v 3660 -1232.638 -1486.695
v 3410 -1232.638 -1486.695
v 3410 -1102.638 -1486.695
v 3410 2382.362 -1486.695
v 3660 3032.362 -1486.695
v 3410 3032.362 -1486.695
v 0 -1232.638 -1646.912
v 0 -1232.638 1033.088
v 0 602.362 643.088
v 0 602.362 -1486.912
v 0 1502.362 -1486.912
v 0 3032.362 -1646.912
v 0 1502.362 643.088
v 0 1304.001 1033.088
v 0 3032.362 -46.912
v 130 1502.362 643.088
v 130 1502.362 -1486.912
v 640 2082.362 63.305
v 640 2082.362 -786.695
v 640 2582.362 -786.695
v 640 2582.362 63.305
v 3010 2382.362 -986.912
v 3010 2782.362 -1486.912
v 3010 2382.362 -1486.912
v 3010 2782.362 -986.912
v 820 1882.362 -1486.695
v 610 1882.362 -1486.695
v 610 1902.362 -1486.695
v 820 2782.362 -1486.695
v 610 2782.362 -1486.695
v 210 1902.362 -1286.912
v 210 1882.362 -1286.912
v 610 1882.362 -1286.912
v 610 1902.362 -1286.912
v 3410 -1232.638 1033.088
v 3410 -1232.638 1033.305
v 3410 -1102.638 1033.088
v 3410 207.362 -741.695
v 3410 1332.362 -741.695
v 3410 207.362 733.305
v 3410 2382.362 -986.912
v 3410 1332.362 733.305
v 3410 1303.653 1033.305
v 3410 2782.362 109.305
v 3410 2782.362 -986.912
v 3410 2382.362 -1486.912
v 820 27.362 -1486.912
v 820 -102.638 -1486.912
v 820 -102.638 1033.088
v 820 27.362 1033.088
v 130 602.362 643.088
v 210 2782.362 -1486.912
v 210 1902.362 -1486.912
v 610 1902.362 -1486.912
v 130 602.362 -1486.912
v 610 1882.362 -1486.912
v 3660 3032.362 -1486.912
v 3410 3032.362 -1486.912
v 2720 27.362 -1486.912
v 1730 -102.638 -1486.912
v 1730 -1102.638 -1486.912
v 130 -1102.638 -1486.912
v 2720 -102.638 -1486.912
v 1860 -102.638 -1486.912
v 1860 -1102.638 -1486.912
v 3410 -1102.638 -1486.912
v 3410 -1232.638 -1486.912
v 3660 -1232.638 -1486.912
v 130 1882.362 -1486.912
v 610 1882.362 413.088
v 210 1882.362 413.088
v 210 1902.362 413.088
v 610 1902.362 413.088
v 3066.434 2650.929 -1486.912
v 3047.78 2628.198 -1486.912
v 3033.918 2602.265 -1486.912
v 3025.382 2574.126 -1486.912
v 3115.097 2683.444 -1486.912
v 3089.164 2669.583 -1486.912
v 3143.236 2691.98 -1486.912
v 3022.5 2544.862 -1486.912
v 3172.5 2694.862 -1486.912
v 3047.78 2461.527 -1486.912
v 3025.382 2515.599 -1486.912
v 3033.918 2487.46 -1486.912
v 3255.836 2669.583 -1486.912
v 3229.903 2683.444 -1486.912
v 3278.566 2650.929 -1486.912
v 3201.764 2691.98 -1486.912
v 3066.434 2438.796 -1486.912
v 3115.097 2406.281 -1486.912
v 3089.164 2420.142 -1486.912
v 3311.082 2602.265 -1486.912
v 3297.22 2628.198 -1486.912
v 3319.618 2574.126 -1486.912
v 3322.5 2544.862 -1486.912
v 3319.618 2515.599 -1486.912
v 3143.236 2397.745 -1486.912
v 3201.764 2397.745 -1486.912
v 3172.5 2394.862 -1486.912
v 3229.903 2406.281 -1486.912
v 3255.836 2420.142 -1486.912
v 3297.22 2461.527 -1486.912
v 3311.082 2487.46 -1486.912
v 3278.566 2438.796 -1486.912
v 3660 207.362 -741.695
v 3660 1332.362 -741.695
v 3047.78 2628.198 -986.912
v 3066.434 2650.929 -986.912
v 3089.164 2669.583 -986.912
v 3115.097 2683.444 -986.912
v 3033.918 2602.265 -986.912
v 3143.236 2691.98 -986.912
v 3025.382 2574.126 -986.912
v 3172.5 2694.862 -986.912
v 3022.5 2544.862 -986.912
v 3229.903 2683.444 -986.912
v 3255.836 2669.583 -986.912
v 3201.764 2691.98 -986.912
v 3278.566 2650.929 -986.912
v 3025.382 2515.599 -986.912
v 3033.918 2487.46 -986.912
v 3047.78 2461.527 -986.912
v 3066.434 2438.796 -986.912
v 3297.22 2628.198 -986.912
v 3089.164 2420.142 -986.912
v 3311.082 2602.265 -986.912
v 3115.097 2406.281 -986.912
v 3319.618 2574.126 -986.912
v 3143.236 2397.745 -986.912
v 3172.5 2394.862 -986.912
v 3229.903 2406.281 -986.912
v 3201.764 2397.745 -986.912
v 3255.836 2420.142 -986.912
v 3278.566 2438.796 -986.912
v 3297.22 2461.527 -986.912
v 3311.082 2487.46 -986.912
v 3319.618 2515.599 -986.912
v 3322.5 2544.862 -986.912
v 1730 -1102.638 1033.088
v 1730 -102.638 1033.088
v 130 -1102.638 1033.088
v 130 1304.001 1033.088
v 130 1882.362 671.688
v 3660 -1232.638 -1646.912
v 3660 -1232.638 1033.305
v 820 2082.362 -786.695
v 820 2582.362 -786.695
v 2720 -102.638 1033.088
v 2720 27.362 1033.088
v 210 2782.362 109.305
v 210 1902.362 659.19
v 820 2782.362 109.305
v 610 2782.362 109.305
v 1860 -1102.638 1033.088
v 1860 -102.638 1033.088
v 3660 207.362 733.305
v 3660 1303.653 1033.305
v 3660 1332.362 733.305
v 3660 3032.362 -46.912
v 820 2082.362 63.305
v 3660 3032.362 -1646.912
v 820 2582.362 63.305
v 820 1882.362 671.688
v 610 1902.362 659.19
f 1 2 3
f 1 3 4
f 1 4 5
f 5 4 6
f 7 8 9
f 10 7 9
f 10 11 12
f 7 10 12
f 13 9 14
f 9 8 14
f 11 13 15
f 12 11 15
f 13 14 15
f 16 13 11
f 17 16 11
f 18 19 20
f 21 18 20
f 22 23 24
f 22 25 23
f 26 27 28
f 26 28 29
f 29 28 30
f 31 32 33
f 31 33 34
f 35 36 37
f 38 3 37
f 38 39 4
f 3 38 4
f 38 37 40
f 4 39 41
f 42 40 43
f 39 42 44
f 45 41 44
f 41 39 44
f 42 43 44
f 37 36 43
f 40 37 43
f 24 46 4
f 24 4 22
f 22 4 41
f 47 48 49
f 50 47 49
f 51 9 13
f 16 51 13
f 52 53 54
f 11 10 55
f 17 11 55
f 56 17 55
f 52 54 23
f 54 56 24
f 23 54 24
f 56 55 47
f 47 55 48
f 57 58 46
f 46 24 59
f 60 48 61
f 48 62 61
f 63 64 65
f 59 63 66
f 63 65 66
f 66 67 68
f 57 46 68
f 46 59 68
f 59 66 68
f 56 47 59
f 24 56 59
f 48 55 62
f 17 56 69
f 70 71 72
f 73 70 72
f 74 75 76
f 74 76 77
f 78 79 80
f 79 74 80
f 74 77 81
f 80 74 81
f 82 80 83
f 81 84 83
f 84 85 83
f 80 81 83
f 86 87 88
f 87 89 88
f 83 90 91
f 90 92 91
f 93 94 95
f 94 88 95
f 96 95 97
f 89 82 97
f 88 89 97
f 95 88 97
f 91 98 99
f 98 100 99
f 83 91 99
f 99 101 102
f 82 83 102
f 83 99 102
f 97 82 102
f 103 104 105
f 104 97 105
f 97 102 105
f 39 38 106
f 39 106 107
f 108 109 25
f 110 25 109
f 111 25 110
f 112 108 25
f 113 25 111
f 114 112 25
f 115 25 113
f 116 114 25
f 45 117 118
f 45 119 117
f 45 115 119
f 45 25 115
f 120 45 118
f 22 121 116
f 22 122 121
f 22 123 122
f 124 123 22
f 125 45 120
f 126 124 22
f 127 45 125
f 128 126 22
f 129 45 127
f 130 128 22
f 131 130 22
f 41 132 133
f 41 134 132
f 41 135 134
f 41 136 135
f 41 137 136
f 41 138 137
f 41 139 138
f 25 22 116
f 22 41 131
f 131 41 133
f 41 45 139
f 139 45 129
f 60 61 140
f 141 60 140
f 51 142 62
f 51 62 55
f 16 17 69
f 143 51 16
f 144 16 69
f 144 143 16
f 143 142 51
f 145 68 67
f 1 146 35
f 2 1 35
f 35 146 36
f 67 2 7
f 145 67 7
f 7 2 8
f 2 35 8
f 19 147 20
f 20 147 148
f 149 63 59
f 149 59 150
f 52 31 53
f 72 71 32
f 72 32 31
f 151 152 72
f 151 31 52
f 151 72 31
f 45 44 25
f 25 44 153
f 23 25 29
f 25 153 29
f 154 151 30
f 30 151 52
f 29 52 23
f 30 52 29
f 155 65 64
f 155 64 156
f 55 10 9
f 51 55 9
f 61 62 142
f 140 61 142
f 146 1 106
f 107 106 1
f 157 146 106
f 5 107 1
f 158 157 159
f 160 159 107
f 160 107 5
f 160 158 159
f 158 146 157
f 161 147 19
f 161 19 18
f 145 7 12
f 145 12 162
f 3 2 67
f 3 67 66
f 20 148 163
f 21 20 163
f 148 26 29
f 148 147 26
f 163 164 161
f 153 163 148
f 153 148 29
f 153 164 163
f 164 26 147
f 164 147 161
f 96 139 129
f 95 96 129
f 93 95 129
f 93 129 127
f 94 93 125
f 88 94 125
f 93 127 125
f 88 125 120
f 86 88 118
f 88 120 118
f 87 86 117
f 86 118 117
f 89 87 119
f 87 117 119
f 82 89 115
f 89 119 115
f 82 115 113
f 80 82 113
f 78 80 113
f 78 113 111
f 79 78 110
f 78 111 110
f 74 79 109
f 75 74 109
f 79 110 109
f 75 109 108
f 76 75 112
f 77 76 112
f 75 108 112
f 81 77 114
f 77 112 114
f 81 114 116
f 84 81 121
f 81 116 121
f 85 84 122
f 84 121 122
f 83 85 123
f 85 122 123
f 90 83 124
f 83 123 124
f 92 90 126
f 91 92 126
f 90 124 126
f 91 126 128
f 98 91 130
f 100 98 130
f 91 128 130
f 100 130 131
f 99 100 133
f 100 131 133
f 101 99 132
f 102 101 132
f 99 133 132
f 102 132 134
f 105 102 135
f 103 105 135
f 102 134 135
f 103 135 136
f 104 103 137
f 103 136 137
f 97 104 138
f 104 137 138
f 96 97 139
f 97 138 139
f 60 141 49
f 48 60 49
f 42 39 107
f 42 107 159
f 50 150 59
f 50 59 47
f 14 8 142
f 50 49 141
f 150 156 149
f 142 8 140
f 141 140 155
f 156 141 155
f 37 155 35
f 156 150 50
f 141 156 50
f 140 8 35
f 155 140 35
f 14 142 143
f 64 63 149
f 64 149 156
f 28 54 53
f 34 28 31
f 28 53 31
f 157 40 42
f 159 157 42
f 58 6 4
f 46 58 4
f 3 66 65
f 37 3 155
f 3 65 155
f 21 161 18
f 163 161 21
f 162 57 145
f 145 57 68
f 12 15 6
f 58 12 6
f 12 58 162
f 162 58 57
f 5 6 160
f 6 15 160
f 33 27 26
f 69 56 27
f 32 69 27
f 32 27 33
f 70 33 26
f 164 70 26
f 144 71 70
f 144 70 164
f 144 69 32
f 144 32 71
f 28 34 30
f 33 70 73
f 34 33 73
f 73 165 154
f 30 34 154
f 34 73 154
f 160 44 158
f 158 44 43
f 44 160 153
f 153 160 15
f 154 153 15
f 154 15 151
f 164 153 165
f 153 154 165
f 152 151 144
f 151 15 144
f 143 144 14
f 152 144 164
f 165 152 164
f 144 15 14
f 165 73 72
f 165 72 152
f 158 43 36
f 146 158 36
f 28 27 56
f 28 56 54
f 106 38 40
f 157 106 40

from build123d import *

# Parameters (mm, degrees)
F1_DEPTH  = 130
F2_DEPTH  = 210
F3_DEPTH  = 3410
F4_W      = 1125
F4_H      = 1475
F5_DEPTH  = 250
F8_DEPTH  = 210
F9_W      = 500
F9_H      = 850
F10_DEPTH = 180
F11_W     = 20
F11_H     = 200
F12_DEPTH = 400
F13_W     = 400
F13_H     = 0.2173379773
F13_H_2   = 499.7826620227
F14_DEPTH = 400
F15_R     = 150
F16_DEPTH = 500
F17_W     = 130
F17_H     = 2520
F18_DEPTH = 3280
F19_W     = 130
F19_H     = 2520
F20_DEPTH = 1000
F21_W     = 860
F21_H     = 2520
F21_W_2   = 130
F21_W_3   = 910
F22_DEPTH = 130
F24_DEPTH = 160


with BuildPart() as f1:
    # F0 (on Right) → F1 (new body)
    with BuildSketch(Plane.YZ):
        Polygon((-1232.6375129807, 1033.0878686905), (-1232.6375129807, -1486.9121313095), (602.3624870193, -1486.9121313095), (602.3624870193, 643.0878686905), (1502.3624870193, 643.0878686905), (1502.3624870193, -1486.9121313095), (1882.3624870193, -1486.9121313095), (1882.3624870193, 671.6876233862), (1304.001195655, 1033.0878686905), align=None)
    extrude(amount=F1_DEPTH)

    # F0 (on Right) → F2 (join)
    with BuildSketch(Plane.YZ):
        Polygon((2782.3624870193, 109.3052066678), (1882.3624870193, 671.6876233862), (1882.3624870193, -1486.9121313095), (2782.3624870193, -1486.9121313095), align=None)
    extrude(amount=F2_DEPTH)

    # F0 (on Right) → F3 (join)
    with BuildSketch(Plane.YZ):
        Polygon((3032.3624870193, -46.9121313095), (2782.3624870193, 109.3052066678), (2782.3624870193, -1486.9121313095), (3032.3624870193, -1486.9121313095), align=None)
    extrude(amount=F3_DEPTH)

    # F4 (on face) → F5 (join)
    with BuildSketch(Plane.YZ.offset(3410)):
        Polygon((-1232.6375129807, 1033.3052066678), (-1232.6375129807, -1486.6947933322), (1882.3624870193, -1486.6947933322), (1882.3624870193, 671.6876233862), (1303.6533821854, 1033.3052066678), align=None)
        with Locations((769.8624870193, -4.1947933322)):
            Rectangle(F4_W, F4_H, mode=Mode.SUBTRACT)
        Polygon((1882.3624870193, 671.6876233862), (1882.3624870193, -1486.6947933322), (2782.3624870193, -1486.6947933322), (2782.3624870193, 109.3052066678), align=None)
        Polygon((2782.3624870193, 109.3052066678), (2782.3624870193, -1486.6947933322), (3032.3624870193, -1486.6947933322), (3032.3624870193, -46.9121313095), align=None)
    extrude(amount=F5_DEPTH)



with BuildPart() as f8:
    # F7 (on offset) → F8 (new body)
    with BuildSketch(Plane.YZ.offset(610)):
        Polygon((2782.3624870193, 109.3052066678), (1882.3624870193, 671.6876233862), (1882.3624870193, -1486.6947933322), (2782.3624870193, -1486.6947933322), align=None)
    extrude(amount=F8_DEPTH)

    # F9 (on face) → F10 (cut)
    with BuildSketch(Plane.YZ.offset(820)):
        with Locations((2332.3624870193, -361.6947933322)):
            Rectangle(F9_W, F9_H)
    extrude(amount=-F10_DEPTH, mode=Mode.SUBTRACT)


with BuildPart() as f1_1:
    add(f1.part)

    add(f8.part)  # F12 merges F8
    # F11 (on face) → F12 (join)
    with BuildSketch(Plane.YZ.offset(210)):
        with Locations((1892.3624870193, -1386.9121313095)):
            Rectangle(F11_W, F11_H)
        Polygon((1902.3624870193, 659.190236348), (1882.3624870193, 671.6876233862), (1882.3624870193, 413.0878686905), (1902.3624870193, 413.0878686905), align=None)
    extrude(amount=F12_DEPTH)

    # F13 (on face) → F14 (join)
    with BuildSketch(Plane(origin=(3410, 0, 0), x_dir=(0, -1, 0), z_dir=(-1, 0, 0))):
        with Locations((-2582.3624870193, -1486.8034623208)):
            Rectangle(F13_W, F13_H)
        with Locations((-2582.3624870193, -1236.8034623208)):
            Rectangle(F13_W, F13_H_2)
    extrude(amount=F14_DEPTH)

    # F15 (on face) → F16 (cut, through all)
    with BuildSketch(Plane.XY.offset(-986.9121313095)):
        with Locations((3172.5, 2544.8624870193)):
            Circle(F15_R)
    extrude(amount=-F16_DEPTH, mode=Mode.SUBTRACT)

    # F17 (on face) → F18 (join, through all)
    with BuildSketch(Plane.YZ.offset(130)):
        with Locations((-1167.6375129807, -226.9121313095)):
            Rectangle(F17_W, F17_H)
    extrude(amount=F18_DEPTH)

    # F19 (on face) → F20 (join)
    with BuildSketch(Plane(origin=(0, -1102.6375129807, 0), x_dir=(-1, 0, 0), z_dir=(0, 1, 0))):
        with Locations((-1795, -226.9121313095)):
            Rectangle(F19_W, F19_H)
    extrude(amount=F20_DEPTH)

    # F21 (on face) → F22 (join)
    with BuildSketch(Plane(origin=(0, -102.6375129807, 0), x_dir=(-1, 0, 0), z_dir=(0, 1, 0))):
        with Locations((-2290, -226.9121313095)):
            Rectangle(F21_W, F21_H)
        with Locations((-1795, -226.9121313095)):
            Rectangle(F21_W_2, F21_H)
        with Locations((-1275, -226.9121313095)):
            Rectangle(F21_W_3, F21_H)
    extrude(amount=F22_DEPTH)

    # F23 (on face) → F24 (join)
    with BuildSketch(Plane(origin=(0, 0, -1486.9121313095), x_dir=(1, 0, 0), z_dir=(0, 0, -1))):
        Polygon((3660, 1232.6375129807), (3410, 1232.6375129807), (3410, 1102.6375129807), (1860, 1102.6375129807), (1860, 102.6375129807), (2720, 102.6375129807), (2720, -27.3624870193), (820, -27.3624870193), (820, 102.6375129807), (1730, 102.6375129807), (1730, 1102.6375129807), (130, 1102.6375129807), (130, -602.3624870193), (0, -602.3624870193), (0, -3032.3624870193), (3660, -3032.3624870193), align=None)
        Polygon((3410, 1232.6375129807), (0, 1232.6375129807), (0, -602.3624870193), (130, -602.3624870193), (130, 1102.6375129807), (1730, 1102.6375129807), (1730, 102.6375129807), (820, 102.6375129807), (820, -27.3624870193), (2720, -27.3624870193), (2720, 102.6375129807), (1860, 102.6375129807), (1860, 1102.6375129807), (3410, 1102.6375129807), align=None)
    extrude(amount=F24_DEPTH)


solid = f1_1.part
